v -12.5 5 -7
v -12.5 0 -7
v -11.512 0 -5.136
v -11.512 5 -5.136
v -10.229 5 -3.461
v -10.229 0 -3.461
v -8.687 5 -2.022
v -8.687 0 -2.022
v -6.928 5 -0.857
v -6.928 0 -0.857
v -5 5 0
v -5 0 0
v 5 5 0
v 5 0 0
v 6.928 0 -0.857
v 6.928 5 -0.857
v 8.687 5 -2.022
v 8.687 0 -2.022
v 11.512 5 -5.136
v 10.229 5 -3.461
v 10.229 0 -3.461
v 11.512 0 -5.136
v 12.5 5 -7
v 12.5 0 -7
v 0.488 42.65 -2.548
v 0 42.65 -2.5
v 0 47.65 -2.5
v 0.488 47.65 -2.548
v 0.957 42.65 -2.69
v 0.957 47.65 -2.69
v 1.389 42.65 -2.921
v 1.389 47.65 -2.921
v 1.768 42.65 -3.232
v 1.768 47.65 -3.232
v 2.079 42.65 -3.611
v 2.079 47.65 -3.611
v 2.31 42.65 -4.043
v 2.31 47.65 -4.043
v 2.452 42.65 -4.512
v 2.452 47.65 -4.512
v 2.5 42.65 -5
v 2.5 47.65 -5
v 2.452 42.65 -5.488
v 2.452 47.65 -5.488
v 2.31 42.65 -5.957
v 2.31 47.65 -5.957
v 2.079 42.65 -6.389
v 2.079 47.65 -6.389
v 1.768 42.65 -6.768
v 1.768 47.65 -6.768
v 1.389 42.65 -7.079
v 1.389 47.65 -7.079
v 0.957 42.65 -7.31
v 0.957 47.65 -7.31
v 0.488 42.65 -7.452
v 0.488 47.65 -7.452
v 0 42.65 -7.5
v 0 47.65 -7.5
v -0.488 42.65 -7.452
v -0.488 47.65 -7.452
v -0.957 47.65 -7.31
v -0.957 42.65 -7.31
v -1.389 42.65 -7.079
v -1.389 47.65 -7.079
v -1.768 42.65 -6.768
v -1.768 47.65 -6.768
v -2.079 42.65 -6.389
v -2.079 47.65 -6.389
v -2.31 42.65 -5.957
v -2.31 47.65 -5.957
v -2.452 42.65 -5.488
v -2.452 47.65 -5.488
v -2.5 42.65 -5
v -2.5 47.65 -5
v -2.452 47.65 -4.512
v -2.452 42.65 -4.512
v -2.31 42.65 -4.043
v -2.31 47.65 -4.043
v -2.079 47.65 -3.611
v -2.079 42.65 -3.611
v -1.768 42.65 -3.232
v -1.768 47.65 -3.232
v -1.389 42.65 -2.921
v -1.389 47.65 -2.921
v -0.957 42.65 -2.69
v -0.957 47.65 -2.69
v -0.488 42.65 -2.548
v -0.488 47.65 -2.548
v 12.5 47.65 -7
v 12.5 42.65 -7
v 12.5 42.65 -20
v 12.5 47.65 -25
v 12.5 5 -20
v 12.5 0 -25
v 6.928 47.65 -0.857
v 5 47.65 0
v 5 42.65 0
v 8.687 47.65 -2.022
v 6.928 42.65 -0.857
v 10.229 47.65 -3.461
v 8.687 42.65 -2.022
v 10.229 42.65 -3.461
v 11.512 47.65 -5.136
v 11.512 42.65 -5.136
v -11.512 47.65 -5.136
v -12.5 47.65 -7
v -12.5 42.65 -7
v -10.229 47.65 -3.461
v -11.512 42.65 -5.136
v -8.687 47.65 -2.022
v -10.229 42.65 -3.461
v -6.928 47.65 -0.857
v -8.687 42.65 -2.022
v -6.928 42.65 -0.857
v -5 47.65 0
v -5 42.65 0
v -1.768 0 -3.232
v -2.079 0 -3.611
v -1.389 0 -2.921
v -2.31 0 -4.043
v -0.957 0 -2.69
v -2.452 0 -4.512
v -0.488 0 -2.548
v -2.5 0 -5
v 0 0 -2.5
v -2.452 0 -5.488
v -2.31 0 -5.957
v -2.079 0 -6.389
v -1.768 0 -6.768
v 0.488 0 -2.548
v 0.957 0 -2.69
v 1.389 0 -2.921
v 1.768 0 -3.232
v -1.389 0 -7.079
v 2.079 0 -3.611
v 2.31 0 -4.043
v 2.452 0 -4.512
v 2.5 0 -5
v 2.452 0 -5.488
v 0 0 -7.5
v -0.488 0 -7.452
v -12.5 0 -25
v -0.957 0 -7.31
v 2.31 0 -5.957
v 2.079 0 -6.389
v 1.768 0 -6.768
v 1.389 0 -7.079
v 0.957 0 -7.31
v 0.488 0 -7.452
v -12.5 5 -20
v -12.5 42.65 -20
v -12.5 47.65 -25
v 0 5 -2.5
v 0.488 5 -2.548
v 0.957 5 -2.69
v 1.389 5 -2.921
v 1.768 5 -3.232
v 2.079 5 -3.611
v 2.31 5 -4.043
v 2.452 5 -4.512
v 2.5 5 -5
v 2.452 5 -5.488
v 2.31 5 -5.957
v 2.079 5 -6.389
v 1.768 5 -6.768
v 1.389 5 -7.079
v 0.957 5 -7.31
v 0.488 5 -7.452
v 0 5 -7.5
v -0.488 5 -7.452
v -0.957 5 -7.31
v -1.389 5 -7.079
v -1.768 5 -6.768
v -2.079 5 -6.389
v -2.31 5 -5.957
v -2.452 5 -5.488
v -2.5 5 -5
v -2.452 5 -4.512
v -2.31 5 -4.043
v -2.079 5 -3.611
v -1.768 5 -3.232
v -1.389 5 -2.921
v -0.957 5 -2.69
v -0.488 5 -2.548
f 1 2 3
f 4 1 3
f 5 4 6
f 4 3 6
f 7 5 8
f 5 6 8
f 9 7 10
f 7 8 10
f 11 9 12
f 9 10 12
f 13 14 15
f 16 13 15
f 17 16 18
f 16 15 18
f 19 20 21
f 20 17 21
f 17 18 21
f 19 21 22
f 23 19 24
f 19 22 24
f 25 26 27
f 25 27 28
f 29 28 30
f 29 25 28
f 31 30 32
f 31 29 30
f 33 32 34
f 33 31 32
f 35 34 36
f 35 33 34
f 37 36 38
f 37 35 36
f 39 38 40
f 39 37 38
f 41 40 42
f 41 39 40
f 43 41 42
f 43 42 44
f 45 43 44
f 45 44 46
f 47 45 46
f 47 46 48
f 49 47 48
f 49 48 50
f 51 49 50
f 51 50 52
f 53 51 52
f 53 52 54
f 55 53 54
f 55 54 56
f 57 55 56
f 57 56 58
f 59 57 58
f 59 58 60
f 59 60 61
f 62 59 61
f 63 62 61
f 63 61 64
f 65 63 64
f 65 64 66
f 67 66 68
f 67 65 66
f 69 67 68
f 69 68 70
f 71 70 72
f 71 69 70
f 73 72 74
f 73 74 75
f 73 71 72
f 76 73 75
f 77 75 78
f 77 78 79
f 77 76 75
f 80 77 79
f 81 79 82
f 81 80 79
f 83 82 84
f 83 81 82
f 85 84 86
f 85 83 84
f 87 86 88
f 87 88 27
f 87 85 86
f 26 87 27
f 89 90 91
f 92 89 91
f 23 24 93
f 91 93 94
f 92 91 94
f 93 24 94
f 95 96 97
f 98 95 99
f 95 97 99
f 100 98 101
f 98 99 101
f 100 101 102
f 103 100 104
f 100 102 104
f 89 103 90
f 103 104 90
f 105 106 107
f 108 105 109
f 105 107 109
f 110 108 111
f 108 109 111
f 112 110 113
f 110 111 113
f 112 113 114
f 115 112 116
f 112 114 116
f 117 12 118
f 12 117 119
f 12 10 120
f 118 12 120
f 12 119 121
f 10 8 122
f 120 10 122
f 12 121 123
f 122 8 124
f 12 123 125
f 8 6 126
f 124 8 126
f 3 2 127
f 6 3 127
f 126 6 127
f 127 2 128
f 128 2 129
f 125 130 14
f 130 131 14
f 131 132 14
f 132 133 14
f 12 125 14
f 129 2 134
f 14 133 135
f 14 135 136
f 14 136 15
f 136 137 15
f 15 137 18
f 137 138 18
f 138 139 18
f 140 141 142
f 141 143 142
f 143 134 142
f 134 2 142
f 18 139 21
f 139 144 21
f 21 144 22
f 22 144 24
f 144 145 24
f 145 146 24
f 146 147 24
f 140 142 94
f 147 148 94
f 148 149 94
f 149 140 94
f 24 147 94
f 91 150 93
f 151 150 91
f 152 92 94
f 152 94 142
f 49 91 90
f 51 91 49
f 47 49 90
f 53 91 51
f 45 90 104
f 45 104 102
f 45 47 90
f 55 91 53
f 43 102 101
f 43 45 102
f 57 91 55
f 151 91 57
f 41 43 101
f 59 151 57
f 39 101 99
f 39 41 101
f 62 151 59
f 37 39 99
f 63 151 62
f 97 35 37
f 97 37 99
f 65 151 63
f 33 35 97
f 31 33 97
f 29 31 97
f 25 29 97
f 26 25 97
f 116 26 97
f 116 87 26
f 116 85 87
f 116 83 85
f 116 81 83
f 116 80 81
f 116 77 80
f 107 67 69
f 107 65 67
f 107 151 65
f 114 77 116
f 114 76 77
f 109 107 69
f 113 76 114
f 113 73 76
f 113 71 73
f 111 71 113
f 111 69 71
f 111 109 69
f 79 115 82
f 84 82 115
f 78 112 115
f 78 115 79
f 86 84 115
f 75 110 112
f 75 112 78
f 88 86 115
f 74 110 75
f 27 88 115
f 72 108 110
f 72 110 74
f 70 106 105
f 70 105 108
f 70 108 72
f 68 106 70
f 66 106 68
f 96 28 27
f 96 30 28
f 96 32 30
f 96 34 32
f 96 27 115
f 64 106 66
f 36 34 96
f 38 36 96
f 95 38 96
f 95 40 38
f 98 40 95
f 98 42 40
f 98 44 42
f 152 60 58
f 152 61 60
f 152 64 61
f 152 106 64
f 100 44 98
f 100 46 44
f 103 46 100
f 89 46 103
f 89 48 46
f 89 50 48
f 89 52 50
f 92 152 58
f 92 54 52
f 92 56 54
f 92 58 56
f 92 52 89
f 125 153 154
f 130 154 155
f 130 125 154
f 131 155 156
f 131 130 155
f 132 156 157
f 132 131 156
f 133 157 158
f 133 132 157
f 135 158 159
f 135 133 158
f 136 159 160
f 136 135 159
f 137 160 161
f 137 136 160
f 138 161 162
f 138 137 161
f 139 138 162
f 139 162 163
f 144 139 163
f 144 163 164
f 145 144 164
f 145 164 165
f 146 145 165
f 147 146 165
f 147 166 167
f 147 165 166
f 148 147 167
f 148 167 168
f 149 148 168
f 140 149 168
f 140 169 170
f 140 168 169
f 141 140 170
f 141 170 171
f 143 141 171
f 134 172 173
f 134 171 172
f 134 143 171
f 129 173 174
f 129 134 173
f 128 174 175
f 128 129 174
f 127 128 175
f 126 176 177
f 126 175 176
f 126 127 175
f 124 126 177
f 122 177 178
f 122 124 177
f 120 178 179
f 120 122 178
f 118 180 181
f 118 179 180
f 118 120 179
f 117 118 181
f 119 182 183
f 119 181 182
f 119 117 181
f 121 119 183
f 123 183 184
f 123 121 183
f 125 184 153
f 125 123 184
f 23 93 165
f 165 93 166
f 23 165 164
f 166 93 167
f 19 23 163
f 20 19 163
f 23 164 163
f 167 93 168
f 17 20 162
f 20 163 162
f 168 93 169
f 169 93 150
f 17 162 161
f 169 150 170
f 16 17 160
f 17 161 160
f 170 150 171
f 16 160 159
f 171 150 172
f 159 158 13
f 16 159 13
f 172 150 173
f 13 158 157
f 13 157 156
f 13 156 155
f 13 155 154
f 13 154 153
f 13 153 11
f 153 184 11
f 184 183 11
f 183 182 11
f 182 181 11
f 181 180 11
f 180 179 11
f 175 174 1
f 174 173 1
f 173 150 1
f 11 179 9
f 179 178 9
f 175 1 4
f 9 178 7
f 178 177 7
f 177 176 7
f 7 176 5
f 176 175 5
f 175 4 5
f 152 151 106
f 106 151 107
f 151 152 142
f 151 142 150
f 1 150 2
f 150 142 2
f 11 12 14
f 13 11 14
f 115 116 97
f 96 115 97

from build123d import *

# Parameters (mm, degrees)
SKETCH1_R           = 2.5
BOSS_EXTRUDE1_DEPTH = 47.65
SKETCH2_W           = 20
SKETCH2_H           = 37.65
CUT_EXTRUDE1_DEPTH  = 60.333991101


with BuildPart() as part:
    # Sketch1 → Boss-Extrude1 (new body)
    with BuildSketch(Plane(origin=(0, 0, 0), x_dir=(1, 0, 0), z_dir=(0, 1, 0))):
        with BuildLine():
            Line((-5, 0), (5, 0))
            ThreePointArc((5, 0), (9.487755282, 2.709547912), (12.5, 7))
            Line((12.5, 7), (12.5, 25))
            Line((12.5, 25), (-12.5, 25))
            Line((-12.5, 25), (-12.5, 7))
            ThreePointArc((-12.5, 7), (-9.487755282, 2.709547912), (-5, 0))
        make_face()
        with Locations(Location((0, 5, 0), (0, 0, 270))):
            Circle(SKETCH1_R, mode=Mode.SUBTRACT)
    extrude(amount=BOSS_EXTRUDE1_DEPTH)

    # Sketch2 → Cut-Extrude1 (cut, through all)
    with BuildSketch(Plane.ZY.offset(12.5)):
        with Locations((-10, 23.825)):
            Rectangle(SKETCH2_W, SKETCH2_H)
    extrude(amount=-CUT_EXTRUDE1_DEPTH, mode=Mode.SUBTRACT)


solid = part.part
